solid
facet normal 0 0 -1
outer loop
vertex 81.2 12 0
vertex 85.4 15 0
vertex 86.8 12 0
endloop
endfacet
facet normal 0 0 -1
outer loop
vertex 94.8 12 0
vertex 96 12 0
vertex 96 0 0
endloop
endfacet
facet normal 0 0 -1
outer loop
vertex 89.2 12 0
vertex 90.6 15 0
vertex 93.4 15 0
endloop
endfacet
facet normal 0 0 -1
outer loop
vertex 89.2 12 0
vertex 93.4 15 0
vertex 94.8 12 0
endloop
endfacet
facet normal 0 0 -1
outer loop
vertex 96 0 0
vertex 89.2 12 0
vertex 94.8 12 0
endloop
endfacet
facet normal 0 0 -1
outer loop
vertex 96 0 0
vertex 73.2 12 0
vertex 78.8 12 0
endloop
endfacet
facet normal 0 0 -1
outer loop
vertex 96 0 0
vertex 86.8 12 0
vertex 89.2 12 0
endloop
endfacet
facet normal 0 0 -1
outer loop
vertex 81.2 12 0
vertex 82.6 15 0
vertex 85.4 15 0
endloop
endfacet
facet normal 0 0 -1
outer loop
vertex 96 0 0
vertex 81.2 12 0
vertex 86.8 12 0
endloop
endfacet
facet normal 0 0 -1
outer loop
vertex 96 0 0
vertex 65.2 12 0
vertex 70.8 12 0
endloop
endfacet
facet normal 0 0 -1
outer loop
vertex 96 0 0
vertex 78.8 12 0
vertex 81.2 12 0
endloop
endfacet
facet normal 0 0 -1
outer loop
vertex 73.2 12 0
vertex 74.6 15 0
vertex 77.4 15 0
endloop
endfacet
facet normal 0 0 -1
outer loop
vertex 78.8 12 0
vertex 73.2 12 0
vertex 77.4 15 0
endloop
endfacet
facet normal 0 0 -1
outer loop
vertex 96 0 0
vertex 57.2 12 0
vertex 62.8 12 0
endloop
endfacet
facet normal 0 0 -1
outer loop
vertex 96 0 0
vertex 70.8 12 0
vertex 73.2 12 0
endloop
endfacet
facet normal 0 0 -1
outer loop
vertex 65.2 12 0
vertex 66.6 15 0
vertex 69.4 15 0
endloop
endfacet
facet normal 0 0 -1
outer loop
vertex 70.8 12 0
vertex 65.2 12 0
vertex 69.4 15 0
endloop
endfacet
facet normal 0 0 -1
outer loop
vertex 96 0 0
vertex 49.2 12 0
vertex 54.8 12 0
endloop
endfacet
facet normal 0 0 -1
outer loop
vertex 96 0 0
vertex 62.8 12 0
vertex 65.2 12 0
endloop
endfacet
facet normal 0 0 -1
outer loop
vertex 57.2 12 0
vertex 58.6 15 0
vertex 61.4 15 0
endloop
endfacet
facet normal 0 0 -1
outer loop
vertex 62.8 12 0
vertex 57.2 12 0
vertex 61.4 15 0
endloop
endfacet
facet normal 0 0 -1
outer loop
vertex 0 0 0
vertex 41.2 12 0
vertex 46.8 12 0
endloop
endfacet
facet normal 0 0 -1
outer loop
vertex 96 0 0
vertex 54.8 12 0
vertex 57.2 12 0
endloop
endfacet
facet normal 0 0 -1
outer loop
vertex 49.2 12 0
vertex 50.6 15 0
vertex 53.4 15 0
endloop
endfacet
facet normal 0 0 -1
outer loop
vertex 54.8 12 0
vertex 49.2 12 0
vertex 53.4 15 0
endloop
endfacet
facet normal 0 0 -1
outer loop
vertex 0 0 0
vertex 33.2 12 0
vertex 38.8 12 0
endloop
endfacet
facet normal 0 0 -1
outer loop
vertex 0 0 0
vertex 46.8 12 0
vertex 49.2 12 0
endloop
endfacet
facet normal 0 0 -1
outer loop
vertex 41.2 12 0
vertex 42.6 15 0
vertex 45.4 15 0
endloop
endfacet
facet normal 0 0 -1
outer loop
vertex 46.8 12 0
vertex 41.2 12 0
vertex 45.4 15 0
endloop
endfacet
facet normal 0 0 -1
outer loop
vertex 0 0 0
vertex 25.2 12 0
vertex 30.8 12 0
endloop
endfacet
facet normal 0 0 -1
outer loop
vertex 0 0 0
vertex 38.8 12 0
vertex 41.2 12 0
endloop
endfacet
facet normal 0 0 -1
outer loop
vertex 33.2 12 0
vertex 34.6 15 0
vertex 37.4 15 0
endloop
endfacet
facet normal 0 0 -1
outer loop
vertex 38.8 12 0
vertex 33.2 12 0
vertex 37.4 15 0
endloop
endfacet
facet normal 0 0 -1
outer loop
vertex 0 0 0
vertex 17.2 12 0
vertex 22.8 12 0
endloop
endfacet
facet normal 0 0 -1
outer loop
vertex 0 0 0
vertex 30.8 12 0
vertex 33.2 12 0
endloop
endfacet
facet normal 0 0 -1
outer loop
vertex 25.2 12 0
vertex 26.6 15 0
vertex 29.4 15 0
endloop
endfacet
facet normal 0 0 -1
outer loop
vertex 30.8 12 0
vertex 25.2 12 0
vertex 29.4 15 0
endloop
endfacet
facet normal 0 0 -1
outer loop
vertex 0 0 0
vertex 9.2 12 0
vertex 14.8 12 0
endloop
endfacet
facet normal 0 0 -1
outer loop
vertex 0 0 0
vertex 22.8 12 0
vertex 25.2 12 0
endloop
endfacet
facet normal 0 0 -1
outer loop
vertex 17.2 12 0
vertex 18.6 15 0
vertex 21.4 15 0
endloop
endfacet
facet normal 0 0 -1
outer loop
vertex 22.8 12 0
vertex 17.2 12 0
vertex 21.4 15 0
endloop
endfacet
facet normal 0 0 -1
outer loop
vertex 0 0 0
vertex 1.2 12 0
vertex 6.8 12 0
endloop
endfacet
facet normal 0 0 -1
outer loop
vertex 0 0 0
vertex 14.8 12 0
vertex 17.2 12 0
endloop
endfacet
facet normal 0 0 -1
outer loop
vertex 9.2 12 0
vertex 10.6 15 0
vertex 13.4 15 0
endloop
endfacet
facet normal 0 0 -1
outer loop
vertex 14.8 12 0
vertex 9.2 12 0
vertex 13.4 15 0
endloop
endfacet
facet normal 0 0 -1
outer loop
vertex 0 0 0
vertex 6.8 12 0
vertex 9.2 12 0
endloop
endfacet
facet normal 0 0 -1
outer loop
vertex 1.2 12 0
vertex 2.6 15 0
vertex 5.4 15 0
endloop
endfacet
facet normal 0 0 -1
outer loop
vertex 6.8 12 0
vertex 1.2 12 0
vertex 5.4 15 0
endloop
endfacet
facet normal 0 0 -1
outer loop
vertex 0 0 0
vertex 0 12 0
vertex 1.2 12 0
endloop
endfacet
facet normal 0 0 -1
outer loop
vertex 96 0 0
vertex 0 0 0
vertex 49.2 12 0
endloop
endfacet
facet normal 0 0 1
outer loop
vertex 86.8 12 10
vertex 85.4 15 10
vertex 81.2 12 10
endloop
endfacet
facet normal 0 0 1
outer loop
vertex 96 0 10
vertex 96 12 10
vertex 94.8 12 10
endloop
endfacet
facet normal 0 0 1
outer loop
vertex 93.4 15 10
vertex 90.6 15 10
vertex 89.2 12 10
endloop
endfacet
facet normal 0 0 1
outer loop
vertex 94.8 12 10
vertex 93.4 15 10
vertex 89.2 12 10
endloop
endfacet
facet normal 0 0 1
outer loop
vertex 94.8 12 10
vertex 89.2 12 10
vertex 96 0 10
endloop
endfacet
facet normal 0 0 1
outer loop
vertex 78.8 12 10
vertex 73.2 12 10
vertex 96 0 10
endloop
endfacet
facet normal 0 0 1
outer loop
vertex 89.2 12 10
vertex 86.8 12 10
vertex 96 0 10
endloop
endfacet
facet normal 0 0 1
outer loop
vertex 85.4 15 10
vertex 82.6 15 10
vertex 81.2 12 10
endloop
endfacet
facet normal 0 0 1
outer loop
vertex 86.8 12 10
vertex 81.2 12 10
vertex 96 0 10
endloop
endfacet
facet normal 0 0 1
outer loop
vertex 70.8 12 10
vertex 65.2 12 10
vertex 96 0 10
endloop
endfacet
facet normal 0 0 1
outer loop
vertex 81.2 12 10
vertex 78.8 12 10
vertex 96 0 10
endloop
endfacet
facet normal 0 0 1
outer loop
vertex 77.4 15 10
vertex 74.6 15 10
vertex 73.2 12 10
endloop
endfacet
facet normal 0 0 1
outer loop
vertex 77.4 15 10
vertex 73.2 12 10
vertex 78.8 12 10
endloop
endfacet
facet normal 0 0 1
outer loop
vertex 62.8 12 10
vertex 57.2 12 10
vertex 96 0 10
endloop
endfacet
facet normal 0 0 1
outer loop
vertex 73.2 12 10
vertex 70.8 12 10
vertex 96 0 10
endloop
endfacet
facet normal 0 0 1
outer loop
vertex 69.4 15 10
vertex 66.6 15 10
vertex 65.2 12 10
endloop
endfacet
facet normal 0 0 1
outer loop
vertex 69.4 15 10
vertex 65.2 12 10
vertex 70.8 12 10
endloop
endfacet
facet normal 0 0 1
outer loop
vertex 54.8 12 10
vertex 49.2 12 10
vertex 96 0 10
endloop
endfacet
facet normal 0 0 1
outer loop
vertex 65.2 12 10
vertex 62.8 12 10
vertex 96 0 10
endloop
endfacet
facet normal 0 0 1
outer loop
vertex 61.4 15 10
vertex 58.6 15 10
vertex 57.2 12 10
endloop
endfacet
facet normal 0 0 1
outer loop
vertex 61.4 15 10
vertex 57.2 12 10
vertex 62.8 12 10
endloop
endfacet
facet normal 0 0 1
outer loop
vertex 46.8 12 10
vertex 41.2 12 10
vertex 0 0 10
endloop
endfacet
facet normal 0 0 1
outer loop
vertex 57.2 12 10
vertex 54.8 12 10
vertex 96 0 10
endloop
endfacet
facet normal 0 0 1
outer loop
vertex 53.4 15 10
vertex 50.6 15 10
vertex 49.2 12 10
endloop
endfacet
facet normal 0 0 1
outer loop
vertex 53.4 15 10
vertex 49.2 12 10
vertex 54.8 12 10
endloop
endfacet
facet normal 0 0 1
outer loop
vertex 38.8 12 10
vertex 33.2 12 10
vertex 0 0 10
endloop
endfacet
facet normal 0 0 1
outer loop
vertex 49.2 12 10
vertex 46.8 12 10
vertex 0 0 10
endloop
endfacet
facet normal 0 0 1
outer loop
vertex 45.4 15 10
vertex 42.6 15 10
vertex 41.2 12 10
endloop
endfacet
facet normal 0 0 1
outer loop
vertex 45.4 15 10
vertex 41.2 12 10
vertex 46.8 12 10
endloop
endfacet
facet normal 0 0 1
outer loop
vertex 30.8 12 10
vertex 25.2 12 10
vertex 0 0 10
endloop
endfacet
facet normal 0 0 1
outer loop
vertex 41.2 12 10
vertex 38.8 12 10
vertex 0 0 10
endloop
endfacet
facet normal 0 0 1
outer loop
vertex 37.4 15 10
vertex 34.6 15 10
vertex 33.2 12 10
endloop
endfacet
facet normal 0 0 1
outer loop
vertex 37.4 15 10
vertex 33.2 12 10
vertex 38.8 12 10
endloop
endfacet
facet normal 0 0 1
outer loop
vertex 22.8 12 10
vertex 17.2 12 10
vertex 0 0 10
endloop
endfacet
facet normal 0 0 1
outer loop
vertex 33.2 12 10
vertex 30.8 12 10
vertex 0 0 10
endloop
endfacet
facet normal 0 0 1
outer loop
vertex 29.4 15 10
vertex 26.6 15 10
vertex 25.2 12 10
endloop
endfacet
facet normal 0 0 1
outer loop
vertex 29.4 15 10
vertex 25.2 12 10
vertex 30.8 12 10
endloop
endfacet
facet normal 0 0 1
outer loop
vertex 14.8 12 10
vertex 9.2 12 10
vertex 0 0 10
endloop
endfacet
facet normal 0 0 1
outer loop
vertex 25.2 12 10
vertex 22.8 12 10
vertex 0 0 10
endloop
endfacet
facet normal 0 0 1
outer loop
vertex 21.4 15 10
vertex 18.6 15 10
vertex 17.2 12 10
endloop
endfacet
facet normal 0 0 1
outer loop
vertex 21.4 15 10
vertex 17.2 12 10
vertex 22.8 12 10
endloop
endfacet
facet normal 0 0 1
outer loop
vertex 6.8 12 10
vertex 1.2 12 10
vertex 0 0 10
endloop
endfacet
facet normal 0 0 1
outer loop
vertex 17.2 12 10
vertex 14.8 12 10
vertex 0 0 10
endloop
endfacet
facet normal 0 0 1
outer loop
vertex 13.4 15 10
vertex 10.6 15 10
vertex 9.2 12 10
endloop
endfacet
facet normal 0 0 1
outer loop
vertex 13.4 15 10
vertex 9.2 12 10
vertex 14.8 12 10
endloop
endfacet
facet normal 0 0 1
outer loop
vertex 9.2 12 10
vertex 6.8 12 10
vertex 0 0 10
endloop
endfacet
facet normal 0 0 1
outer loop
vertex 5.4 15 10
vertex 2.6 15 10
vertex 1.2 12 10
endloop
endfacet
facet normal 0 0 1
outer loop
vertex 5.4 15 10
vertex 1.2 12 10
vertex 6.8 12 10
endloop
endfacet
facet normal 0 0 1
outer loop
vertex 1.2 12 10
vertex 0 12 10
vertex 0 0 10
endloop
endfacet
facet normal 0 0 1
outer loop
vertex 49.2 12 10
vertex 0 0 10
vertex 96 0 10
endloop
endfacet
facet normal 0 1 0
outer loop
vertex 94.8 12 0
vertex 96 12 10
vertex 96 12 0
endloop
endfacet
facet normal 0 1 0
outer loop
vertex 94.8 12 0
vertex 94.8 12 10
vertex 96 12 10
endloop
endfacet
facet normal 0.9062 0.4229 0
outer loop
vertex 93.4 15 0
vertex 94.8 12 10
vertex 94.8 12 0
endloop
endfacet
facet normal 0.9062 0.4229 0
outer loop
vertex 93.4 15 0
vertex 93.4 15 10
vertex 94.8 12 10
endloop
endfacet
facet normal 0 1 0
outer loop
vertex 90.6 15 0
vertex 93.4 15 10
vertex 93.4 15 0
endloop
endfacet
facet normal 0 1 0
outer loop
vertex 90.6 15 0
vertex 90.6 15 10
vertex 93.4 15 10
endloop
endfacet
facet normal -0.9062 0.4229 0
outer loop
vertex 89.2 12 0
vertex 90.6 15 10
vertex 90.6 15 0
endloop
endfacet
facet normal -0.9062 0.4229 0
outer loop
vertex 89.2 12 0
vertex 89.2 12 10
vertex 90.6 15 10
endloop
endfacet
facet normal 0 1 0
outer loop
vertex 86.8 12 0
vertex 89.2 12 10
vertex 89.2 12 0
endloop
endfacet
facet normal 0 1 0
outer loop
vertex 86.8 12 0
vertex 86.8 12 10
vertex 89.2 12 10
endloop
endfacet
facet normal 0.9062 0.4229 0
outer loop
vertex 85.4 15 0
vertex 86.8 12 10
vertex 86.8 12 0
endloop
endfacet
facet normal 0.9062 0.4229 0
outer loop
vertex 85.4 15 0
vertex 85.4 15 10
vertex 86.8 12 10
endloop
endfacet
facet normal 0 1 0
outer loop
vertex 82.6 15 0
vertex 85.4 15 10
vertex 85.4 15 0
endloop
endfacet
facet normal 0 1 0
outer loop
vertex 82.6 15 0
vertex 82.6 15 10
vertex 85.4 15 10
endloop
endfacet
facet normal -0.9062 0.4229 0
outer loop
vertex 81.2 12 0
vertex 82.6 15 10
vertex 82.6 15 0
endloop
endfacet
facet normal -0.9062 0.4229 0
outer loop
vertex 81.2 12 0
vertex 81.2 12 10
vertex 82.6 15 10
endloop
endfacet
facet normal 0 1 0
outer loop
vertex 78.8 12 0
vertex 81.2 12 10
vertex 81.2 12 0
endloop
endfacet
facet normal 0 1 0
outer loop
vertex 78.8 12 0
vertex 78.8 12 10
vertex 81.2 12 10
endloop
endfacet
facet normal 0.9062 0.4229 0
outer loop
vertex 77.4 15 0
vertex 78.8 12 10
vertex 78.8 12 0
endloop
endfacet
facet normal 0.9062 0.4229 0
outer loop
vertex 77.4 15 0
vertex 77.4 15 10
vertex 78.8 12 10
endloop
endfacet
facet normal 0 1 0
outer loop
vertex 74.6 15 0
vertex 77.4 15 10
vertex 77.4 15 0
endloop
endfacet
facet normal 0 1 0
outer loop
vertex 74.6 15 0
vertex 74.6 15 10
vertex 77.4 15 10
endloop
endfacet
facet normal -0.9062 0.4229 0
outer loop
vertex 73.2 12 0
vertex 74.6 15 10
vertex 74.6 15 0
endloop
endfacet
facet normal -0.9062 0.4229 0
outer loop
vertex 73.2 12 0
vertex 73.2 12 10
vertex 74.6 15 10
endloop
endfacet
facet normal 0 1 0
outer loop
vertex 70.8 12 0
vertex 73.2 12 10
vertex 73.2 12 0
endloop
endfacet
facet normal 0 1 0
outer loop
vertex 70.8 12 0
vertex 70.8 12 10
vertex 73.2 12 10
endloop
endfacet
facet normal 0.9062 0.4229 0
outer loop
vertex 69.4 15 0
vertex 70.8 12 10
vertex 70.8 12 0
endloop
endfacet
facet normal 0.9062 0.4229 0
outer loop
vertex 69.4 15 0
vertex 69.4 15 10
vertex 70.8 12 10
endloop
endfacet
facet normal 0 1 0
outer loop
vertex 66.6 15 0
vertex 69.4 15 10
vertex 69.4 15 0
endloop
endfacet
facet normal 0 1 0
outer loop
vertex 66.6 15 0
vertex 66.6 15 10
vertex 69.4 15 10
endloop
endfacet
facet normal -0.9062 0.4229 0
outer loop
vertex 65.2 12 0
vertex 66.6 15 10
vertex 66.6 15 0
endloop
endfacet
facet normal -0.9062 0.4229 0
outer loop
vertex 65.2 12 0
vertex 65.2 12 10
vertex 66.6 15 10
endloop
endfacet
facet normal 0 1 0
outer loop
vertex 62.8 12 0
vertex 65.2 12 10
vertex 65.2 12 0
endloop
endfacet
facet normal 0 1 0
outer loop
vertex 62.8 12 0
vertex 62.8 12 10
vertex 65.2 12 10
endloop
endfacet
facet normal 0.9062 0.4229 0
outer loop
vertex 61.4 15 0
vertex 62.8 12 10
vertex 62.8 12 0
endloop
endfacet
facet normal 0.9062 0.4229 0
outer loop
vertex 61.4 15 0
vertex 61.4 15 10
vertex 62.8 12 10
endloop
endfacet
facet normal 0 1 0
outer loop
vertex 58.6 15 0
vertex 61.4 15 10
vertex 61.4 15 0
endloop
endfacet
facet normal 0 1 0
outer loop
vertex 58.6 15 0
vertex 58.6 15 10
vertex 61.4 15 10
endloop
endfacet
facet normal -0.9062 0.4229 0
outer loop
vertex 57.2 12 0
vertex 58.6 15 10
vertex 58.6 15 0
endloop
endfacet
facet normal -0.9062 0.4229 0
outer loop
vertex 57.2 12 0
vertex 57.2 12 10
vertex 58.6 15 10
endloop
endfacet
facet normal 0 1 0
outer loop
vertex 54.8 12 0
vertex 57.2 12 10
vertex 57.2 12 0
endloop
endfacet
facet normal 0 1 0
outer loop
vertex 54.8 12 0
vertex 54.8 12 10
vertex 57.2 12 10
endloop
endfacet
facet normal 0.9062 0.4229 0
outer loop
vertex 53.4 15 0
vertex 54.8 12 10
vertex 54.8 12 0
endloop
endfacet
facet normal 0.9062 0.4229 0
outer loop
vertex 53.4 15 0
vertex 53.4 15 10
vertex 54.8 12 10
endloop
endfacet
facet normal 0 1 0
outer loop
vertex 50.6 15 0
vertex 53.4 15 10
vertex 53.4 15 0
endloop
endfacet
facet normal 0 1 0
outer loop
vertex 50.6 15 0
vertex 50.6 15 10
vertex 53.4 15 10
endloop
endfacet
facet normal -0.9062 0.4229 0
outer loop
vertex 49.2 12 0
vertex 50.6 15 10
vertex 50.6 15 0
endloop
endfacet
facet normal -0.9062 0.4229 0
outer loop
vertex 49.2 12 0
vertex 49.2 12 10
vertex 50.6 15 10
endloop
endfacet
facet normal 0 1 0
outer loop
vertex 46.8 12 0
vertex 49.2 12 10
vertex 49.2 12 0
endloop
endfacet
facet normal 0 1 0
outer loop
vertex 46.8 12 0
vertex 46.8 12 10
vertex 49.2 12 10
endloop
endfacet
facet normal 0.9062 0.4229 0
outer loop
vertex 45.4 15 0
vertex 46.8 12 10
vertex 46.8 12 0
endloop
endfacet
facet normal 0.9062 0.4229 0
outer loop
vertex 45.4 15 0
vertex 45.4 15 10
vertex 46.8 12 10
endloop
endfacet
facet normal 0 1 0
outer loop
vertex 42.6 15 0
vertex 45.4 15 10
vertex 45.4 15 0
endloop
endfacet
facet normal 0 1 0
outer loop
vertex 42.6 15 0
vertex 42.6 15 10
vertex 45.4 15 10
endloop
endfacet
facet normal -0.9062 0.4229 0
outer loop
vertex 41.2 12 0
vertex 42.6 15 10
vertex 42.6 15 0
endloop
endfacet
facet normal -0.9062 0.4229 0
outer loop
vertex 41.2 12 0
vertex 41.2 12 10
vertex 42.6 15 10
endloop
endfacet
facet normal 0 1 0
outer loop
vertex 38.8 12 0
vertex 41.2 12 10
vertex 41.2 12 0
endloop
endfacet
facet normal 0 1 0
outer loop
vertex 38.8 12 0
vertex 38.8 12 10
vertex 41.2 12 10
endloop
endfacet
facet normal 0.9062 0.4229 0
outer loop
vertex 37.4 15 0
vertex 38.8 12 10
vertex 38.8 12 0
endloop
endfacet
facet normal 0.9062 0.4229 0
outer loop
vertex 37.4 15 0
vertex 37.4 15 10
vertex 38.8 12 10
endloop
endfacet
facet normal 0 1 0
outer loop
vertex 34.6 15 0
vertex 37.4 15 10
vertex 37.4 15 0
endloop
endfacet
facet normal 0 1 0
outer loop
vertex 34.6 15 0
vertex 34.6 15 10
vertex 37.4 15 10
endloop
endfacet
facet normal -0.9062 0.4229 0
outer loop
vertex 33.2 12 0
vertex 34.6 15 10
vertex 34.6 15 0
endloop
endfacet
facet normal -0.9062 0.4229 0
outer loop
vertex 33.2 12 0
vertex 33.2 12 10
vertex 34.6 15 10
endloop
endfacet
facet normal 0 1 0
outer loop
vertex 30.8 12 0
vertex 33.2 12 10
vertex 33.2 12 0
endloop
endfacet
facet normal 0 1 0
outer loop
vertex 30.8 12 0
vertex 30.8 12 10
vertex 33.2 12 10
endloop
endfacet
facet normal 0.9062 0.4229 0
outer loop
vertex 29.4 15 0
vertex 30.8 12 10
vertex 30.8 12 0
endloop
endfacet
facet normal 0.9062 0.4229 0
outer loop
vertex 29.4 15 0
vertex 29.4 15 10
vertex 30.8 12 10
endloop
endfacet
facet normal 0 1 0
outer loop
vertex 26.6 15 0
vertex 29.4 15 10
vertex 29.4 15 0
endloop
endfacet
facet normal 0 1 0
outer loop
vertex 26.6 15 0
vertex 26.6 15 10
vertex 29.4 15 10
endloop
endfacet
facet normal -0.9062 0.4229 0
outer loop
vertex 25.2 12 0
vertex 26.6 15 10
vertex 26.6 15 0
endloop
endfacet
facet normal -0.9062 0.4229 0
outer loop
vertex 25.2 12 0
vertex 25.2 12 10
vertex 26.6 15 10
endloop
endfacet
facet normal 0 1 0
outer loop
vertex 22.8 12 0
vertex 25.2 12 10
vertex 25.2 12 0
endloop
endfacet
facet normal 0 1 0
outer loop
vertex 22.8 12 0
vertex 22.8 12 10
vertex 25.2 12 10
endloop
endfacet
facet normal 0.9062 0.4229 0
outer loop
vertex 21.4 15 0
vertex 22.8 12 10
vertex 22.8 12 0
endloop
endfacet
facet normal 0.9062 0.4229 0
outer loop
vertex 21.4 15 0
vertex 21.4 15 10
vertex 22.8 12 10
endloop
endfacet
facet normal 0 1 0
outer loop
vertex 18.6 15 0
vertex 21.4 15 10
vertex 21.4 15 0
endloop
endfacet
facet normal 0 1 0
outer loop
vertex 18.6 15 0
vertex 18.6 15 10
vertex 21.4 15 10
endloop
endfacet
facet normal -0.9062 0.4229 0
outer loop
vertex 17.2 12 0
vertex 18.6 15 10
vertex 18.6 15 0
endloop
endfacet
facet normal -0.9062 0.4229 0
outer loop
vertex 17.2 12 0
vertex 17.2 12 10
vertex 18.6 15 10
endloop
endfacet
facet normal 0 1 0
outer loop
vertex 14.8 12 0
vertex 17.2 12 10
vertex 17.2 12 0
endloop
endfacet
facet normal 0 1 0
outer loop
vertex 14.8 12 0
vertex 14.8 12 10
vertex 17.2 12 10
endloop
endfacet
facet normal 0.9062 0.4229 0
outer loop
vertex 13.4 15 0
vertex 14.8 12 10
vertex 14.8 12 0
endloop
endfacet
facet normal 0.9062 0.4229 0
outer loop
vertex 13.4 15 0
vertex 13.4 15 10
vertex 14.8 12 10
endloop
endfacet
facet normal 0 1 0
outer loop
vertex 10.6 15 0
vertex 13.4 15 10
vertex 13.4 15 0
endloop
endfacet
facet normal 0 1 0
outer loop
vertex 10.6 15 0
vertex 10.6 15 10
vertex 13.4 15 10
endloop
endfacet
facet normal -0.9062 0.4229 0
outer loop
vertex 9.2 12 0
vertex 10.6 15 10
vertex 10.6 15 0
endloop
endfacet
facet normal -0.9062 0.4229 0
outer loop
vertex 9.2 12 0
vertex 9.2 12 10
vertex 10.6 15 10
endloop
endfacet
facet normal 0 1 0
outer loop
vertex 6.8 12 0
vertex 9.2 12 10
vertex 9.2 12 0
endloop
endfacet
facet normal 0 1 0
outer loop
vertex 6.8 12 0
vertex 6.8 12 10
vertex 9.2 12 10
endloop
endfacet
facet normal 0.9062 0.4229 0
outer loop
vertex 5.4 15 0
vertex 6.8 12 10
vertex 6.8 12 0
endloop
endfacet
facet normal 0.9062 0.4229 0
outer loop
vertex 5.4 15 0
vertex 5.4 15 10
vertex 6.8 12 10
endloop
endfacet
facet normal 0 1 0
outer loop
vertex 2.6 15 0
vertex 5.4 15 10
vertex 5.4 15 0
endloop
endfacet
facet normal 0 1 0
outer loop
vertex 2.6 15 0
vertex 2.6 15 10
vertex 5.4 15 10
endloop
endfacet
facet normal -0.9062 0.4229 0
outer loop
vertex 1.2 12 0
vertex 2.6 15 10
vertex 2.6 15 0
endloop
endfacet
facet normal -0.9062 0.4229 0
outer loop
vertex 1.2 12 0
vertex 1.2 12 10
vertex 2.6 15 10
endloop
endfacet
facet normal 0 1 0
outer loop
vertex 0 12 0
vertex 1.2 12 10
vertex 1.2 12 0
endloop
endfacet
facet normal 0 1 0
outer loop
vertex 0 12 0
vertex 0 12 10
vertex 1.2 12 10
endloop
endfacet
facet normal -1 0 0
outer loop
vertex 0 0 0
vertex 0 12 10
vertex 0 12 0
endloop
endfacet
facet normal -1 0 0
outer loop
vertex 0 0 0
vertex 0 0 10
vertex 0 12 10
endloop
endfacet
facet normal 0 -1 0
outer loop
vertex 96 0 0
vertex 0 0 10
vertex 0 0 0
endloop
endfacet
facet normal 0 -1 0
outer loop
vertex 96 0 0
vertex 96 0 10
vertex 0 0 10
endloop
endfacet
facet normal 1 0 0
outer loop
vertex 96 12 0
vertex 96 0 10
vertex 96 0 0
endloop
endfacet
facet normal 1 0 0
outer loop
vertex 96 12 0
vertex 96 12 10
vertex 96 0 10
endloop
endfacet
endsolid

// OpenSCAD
$fn = 32;

// ----------------------------------------------------------------------
// Gear rack: 12 teeth, pitch 8 mm
// ----------------------------------------------------------------------

// --- parameters (mm) ---
teeth = 12;               // number of teeth
pitch = 8;                // tooth pitch, X
root_w = 5.6;             // tooth width at the root
tip_w = 2.8;              // tooth width at the tip
base_h = 12;              // rack body height, Y
tooth_h = 3;              // tooth height above the body
plate_t = 10;             // rack width, Z (extrusion height)

rack_l = teeth * pitch;  // overall length
total_h = base_h + tooth_h;  // overall height

profile = [[0, 0], [96, 0], [96, 12], [94.8, 12], [93.4, 15], [90.6, 15], [89.2, 12], [86.8, 12], [85.4, 15], [82.6, 15], [81.2, 12], [78.8, 12], [77.4, 15], [74.6, 15], [73.2, 12], [70.8, 12], [69.4, 15], [66.6, 15], [65.2, 12], [62.8, 12], [61.4, 15], [58.6, 15], [57.2, 12], [54.8, 12], [53.4, 15], [50.6, 15], [49.2, 12], [46.8, 12], [45.4, 15], [42.6, 15], [41.2, 12], [38.8, 12], [37.4, 15], [34.6, 15], [33.2, 12], [30.8, 12], [29.4, 15], [26.6, 15], [25.2, 12], [22.8, 12], [21.4, 15], [18.6, 15], [17.2, 12], [14.8, 12], [13.4, 15], [10.6, 15], [9.2, 12], [6.8, 12], [5.4, 15], [2.6, 15], [1.2, 12], [0, 12]];  // primary outline, 52 points, counter clockwise

// --- the one profile operation ---
linear_extrude(height = plate_t) polygon(points = profile);
